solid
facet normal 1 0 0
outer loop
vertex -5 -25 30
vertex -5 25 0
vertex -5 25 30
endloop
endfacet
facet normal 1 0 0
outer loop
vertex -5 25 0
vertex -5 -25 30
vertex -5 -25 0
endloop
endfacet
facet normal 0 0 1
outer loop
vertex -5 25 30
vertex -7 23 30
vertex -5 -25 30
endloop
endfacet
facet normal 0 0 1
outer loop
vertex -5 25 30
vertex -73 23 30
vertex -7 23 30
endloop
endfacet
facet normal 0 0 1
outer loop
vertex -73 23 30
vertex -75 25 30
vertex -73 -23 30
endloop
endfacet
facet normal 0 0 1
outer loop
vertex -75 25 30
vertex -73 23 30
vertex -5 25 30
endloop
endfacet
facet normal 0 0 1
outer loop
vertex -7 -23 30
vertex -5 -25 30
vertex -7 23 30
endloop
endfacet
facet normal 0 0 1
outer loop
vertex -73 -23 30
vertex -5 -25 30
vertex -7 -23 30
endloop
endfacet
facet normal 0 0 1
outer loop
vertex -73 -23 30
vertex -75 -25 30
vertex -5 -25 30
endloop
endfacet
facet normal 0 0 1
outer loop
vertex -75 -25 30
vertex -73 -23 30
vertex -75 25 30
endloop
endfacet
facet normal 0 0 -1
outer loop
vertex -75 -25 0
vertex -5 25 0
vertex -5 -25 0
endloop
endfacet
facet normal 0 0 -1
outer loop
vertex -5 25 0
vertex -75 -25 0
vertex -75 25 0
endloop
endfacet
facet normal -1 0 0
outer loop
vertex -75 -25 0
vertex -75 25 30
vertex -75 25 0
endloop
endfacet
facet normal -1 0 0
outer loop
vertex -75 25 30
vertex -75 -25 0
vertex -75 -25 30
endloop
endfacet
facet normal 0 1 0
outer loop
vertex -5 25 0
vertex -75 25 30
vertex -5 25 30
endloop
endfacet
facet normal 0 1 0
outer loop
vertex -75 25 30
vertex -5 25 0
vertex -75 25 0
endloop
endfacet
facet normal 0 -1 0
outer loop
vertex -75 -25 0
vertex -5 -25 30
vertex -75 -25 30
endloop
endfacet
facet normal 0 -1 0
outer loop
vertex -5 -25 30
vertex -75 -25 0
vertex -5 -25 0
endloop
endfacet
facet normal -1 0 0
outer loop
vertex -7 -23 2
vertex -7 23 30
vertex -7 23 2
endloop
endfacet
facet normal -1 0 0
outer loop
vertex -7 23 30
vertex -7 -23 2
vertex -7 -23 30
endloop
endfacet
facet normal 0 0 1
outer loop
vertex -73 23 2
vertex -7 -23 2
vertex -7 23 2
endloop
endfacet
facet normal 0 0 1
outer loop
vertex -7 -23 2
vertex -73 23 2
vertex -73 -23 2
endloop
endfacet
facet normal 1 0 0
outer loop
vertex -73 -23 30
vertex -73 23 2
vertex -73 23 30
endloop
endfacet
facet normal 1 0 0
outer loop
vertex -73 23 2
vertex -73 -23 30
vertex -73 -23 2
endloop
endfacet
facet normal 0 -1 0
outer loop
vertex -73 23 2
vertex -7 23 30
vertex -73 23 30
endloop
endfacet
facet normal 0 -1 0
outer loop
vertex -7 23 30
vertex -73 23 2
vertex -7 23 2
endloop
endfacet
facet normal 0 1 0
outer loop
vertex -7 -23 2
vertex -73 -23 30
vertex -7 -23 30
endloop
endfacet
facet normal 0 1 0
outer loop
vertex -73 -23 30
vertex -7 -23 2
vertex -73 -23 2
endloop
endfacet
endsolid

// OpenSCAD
// Built by bench/smallmodels/features/compiler.py from a list of features.
$fn = 64;
difference() {
  union() {
    translate([-40, 0, 0]) translate([-35, -25, 0]) cube([70, 50, 30]);
  }
  translate([-73, -23, 2]) cube([66, 46, 29]);  // shell, wall 2, open top
}
union() {
    translate([-40, 0, 0]) translate([-32.8, -22.8, 0]) cube([65.6, 45.6, 1.5]);
  }
